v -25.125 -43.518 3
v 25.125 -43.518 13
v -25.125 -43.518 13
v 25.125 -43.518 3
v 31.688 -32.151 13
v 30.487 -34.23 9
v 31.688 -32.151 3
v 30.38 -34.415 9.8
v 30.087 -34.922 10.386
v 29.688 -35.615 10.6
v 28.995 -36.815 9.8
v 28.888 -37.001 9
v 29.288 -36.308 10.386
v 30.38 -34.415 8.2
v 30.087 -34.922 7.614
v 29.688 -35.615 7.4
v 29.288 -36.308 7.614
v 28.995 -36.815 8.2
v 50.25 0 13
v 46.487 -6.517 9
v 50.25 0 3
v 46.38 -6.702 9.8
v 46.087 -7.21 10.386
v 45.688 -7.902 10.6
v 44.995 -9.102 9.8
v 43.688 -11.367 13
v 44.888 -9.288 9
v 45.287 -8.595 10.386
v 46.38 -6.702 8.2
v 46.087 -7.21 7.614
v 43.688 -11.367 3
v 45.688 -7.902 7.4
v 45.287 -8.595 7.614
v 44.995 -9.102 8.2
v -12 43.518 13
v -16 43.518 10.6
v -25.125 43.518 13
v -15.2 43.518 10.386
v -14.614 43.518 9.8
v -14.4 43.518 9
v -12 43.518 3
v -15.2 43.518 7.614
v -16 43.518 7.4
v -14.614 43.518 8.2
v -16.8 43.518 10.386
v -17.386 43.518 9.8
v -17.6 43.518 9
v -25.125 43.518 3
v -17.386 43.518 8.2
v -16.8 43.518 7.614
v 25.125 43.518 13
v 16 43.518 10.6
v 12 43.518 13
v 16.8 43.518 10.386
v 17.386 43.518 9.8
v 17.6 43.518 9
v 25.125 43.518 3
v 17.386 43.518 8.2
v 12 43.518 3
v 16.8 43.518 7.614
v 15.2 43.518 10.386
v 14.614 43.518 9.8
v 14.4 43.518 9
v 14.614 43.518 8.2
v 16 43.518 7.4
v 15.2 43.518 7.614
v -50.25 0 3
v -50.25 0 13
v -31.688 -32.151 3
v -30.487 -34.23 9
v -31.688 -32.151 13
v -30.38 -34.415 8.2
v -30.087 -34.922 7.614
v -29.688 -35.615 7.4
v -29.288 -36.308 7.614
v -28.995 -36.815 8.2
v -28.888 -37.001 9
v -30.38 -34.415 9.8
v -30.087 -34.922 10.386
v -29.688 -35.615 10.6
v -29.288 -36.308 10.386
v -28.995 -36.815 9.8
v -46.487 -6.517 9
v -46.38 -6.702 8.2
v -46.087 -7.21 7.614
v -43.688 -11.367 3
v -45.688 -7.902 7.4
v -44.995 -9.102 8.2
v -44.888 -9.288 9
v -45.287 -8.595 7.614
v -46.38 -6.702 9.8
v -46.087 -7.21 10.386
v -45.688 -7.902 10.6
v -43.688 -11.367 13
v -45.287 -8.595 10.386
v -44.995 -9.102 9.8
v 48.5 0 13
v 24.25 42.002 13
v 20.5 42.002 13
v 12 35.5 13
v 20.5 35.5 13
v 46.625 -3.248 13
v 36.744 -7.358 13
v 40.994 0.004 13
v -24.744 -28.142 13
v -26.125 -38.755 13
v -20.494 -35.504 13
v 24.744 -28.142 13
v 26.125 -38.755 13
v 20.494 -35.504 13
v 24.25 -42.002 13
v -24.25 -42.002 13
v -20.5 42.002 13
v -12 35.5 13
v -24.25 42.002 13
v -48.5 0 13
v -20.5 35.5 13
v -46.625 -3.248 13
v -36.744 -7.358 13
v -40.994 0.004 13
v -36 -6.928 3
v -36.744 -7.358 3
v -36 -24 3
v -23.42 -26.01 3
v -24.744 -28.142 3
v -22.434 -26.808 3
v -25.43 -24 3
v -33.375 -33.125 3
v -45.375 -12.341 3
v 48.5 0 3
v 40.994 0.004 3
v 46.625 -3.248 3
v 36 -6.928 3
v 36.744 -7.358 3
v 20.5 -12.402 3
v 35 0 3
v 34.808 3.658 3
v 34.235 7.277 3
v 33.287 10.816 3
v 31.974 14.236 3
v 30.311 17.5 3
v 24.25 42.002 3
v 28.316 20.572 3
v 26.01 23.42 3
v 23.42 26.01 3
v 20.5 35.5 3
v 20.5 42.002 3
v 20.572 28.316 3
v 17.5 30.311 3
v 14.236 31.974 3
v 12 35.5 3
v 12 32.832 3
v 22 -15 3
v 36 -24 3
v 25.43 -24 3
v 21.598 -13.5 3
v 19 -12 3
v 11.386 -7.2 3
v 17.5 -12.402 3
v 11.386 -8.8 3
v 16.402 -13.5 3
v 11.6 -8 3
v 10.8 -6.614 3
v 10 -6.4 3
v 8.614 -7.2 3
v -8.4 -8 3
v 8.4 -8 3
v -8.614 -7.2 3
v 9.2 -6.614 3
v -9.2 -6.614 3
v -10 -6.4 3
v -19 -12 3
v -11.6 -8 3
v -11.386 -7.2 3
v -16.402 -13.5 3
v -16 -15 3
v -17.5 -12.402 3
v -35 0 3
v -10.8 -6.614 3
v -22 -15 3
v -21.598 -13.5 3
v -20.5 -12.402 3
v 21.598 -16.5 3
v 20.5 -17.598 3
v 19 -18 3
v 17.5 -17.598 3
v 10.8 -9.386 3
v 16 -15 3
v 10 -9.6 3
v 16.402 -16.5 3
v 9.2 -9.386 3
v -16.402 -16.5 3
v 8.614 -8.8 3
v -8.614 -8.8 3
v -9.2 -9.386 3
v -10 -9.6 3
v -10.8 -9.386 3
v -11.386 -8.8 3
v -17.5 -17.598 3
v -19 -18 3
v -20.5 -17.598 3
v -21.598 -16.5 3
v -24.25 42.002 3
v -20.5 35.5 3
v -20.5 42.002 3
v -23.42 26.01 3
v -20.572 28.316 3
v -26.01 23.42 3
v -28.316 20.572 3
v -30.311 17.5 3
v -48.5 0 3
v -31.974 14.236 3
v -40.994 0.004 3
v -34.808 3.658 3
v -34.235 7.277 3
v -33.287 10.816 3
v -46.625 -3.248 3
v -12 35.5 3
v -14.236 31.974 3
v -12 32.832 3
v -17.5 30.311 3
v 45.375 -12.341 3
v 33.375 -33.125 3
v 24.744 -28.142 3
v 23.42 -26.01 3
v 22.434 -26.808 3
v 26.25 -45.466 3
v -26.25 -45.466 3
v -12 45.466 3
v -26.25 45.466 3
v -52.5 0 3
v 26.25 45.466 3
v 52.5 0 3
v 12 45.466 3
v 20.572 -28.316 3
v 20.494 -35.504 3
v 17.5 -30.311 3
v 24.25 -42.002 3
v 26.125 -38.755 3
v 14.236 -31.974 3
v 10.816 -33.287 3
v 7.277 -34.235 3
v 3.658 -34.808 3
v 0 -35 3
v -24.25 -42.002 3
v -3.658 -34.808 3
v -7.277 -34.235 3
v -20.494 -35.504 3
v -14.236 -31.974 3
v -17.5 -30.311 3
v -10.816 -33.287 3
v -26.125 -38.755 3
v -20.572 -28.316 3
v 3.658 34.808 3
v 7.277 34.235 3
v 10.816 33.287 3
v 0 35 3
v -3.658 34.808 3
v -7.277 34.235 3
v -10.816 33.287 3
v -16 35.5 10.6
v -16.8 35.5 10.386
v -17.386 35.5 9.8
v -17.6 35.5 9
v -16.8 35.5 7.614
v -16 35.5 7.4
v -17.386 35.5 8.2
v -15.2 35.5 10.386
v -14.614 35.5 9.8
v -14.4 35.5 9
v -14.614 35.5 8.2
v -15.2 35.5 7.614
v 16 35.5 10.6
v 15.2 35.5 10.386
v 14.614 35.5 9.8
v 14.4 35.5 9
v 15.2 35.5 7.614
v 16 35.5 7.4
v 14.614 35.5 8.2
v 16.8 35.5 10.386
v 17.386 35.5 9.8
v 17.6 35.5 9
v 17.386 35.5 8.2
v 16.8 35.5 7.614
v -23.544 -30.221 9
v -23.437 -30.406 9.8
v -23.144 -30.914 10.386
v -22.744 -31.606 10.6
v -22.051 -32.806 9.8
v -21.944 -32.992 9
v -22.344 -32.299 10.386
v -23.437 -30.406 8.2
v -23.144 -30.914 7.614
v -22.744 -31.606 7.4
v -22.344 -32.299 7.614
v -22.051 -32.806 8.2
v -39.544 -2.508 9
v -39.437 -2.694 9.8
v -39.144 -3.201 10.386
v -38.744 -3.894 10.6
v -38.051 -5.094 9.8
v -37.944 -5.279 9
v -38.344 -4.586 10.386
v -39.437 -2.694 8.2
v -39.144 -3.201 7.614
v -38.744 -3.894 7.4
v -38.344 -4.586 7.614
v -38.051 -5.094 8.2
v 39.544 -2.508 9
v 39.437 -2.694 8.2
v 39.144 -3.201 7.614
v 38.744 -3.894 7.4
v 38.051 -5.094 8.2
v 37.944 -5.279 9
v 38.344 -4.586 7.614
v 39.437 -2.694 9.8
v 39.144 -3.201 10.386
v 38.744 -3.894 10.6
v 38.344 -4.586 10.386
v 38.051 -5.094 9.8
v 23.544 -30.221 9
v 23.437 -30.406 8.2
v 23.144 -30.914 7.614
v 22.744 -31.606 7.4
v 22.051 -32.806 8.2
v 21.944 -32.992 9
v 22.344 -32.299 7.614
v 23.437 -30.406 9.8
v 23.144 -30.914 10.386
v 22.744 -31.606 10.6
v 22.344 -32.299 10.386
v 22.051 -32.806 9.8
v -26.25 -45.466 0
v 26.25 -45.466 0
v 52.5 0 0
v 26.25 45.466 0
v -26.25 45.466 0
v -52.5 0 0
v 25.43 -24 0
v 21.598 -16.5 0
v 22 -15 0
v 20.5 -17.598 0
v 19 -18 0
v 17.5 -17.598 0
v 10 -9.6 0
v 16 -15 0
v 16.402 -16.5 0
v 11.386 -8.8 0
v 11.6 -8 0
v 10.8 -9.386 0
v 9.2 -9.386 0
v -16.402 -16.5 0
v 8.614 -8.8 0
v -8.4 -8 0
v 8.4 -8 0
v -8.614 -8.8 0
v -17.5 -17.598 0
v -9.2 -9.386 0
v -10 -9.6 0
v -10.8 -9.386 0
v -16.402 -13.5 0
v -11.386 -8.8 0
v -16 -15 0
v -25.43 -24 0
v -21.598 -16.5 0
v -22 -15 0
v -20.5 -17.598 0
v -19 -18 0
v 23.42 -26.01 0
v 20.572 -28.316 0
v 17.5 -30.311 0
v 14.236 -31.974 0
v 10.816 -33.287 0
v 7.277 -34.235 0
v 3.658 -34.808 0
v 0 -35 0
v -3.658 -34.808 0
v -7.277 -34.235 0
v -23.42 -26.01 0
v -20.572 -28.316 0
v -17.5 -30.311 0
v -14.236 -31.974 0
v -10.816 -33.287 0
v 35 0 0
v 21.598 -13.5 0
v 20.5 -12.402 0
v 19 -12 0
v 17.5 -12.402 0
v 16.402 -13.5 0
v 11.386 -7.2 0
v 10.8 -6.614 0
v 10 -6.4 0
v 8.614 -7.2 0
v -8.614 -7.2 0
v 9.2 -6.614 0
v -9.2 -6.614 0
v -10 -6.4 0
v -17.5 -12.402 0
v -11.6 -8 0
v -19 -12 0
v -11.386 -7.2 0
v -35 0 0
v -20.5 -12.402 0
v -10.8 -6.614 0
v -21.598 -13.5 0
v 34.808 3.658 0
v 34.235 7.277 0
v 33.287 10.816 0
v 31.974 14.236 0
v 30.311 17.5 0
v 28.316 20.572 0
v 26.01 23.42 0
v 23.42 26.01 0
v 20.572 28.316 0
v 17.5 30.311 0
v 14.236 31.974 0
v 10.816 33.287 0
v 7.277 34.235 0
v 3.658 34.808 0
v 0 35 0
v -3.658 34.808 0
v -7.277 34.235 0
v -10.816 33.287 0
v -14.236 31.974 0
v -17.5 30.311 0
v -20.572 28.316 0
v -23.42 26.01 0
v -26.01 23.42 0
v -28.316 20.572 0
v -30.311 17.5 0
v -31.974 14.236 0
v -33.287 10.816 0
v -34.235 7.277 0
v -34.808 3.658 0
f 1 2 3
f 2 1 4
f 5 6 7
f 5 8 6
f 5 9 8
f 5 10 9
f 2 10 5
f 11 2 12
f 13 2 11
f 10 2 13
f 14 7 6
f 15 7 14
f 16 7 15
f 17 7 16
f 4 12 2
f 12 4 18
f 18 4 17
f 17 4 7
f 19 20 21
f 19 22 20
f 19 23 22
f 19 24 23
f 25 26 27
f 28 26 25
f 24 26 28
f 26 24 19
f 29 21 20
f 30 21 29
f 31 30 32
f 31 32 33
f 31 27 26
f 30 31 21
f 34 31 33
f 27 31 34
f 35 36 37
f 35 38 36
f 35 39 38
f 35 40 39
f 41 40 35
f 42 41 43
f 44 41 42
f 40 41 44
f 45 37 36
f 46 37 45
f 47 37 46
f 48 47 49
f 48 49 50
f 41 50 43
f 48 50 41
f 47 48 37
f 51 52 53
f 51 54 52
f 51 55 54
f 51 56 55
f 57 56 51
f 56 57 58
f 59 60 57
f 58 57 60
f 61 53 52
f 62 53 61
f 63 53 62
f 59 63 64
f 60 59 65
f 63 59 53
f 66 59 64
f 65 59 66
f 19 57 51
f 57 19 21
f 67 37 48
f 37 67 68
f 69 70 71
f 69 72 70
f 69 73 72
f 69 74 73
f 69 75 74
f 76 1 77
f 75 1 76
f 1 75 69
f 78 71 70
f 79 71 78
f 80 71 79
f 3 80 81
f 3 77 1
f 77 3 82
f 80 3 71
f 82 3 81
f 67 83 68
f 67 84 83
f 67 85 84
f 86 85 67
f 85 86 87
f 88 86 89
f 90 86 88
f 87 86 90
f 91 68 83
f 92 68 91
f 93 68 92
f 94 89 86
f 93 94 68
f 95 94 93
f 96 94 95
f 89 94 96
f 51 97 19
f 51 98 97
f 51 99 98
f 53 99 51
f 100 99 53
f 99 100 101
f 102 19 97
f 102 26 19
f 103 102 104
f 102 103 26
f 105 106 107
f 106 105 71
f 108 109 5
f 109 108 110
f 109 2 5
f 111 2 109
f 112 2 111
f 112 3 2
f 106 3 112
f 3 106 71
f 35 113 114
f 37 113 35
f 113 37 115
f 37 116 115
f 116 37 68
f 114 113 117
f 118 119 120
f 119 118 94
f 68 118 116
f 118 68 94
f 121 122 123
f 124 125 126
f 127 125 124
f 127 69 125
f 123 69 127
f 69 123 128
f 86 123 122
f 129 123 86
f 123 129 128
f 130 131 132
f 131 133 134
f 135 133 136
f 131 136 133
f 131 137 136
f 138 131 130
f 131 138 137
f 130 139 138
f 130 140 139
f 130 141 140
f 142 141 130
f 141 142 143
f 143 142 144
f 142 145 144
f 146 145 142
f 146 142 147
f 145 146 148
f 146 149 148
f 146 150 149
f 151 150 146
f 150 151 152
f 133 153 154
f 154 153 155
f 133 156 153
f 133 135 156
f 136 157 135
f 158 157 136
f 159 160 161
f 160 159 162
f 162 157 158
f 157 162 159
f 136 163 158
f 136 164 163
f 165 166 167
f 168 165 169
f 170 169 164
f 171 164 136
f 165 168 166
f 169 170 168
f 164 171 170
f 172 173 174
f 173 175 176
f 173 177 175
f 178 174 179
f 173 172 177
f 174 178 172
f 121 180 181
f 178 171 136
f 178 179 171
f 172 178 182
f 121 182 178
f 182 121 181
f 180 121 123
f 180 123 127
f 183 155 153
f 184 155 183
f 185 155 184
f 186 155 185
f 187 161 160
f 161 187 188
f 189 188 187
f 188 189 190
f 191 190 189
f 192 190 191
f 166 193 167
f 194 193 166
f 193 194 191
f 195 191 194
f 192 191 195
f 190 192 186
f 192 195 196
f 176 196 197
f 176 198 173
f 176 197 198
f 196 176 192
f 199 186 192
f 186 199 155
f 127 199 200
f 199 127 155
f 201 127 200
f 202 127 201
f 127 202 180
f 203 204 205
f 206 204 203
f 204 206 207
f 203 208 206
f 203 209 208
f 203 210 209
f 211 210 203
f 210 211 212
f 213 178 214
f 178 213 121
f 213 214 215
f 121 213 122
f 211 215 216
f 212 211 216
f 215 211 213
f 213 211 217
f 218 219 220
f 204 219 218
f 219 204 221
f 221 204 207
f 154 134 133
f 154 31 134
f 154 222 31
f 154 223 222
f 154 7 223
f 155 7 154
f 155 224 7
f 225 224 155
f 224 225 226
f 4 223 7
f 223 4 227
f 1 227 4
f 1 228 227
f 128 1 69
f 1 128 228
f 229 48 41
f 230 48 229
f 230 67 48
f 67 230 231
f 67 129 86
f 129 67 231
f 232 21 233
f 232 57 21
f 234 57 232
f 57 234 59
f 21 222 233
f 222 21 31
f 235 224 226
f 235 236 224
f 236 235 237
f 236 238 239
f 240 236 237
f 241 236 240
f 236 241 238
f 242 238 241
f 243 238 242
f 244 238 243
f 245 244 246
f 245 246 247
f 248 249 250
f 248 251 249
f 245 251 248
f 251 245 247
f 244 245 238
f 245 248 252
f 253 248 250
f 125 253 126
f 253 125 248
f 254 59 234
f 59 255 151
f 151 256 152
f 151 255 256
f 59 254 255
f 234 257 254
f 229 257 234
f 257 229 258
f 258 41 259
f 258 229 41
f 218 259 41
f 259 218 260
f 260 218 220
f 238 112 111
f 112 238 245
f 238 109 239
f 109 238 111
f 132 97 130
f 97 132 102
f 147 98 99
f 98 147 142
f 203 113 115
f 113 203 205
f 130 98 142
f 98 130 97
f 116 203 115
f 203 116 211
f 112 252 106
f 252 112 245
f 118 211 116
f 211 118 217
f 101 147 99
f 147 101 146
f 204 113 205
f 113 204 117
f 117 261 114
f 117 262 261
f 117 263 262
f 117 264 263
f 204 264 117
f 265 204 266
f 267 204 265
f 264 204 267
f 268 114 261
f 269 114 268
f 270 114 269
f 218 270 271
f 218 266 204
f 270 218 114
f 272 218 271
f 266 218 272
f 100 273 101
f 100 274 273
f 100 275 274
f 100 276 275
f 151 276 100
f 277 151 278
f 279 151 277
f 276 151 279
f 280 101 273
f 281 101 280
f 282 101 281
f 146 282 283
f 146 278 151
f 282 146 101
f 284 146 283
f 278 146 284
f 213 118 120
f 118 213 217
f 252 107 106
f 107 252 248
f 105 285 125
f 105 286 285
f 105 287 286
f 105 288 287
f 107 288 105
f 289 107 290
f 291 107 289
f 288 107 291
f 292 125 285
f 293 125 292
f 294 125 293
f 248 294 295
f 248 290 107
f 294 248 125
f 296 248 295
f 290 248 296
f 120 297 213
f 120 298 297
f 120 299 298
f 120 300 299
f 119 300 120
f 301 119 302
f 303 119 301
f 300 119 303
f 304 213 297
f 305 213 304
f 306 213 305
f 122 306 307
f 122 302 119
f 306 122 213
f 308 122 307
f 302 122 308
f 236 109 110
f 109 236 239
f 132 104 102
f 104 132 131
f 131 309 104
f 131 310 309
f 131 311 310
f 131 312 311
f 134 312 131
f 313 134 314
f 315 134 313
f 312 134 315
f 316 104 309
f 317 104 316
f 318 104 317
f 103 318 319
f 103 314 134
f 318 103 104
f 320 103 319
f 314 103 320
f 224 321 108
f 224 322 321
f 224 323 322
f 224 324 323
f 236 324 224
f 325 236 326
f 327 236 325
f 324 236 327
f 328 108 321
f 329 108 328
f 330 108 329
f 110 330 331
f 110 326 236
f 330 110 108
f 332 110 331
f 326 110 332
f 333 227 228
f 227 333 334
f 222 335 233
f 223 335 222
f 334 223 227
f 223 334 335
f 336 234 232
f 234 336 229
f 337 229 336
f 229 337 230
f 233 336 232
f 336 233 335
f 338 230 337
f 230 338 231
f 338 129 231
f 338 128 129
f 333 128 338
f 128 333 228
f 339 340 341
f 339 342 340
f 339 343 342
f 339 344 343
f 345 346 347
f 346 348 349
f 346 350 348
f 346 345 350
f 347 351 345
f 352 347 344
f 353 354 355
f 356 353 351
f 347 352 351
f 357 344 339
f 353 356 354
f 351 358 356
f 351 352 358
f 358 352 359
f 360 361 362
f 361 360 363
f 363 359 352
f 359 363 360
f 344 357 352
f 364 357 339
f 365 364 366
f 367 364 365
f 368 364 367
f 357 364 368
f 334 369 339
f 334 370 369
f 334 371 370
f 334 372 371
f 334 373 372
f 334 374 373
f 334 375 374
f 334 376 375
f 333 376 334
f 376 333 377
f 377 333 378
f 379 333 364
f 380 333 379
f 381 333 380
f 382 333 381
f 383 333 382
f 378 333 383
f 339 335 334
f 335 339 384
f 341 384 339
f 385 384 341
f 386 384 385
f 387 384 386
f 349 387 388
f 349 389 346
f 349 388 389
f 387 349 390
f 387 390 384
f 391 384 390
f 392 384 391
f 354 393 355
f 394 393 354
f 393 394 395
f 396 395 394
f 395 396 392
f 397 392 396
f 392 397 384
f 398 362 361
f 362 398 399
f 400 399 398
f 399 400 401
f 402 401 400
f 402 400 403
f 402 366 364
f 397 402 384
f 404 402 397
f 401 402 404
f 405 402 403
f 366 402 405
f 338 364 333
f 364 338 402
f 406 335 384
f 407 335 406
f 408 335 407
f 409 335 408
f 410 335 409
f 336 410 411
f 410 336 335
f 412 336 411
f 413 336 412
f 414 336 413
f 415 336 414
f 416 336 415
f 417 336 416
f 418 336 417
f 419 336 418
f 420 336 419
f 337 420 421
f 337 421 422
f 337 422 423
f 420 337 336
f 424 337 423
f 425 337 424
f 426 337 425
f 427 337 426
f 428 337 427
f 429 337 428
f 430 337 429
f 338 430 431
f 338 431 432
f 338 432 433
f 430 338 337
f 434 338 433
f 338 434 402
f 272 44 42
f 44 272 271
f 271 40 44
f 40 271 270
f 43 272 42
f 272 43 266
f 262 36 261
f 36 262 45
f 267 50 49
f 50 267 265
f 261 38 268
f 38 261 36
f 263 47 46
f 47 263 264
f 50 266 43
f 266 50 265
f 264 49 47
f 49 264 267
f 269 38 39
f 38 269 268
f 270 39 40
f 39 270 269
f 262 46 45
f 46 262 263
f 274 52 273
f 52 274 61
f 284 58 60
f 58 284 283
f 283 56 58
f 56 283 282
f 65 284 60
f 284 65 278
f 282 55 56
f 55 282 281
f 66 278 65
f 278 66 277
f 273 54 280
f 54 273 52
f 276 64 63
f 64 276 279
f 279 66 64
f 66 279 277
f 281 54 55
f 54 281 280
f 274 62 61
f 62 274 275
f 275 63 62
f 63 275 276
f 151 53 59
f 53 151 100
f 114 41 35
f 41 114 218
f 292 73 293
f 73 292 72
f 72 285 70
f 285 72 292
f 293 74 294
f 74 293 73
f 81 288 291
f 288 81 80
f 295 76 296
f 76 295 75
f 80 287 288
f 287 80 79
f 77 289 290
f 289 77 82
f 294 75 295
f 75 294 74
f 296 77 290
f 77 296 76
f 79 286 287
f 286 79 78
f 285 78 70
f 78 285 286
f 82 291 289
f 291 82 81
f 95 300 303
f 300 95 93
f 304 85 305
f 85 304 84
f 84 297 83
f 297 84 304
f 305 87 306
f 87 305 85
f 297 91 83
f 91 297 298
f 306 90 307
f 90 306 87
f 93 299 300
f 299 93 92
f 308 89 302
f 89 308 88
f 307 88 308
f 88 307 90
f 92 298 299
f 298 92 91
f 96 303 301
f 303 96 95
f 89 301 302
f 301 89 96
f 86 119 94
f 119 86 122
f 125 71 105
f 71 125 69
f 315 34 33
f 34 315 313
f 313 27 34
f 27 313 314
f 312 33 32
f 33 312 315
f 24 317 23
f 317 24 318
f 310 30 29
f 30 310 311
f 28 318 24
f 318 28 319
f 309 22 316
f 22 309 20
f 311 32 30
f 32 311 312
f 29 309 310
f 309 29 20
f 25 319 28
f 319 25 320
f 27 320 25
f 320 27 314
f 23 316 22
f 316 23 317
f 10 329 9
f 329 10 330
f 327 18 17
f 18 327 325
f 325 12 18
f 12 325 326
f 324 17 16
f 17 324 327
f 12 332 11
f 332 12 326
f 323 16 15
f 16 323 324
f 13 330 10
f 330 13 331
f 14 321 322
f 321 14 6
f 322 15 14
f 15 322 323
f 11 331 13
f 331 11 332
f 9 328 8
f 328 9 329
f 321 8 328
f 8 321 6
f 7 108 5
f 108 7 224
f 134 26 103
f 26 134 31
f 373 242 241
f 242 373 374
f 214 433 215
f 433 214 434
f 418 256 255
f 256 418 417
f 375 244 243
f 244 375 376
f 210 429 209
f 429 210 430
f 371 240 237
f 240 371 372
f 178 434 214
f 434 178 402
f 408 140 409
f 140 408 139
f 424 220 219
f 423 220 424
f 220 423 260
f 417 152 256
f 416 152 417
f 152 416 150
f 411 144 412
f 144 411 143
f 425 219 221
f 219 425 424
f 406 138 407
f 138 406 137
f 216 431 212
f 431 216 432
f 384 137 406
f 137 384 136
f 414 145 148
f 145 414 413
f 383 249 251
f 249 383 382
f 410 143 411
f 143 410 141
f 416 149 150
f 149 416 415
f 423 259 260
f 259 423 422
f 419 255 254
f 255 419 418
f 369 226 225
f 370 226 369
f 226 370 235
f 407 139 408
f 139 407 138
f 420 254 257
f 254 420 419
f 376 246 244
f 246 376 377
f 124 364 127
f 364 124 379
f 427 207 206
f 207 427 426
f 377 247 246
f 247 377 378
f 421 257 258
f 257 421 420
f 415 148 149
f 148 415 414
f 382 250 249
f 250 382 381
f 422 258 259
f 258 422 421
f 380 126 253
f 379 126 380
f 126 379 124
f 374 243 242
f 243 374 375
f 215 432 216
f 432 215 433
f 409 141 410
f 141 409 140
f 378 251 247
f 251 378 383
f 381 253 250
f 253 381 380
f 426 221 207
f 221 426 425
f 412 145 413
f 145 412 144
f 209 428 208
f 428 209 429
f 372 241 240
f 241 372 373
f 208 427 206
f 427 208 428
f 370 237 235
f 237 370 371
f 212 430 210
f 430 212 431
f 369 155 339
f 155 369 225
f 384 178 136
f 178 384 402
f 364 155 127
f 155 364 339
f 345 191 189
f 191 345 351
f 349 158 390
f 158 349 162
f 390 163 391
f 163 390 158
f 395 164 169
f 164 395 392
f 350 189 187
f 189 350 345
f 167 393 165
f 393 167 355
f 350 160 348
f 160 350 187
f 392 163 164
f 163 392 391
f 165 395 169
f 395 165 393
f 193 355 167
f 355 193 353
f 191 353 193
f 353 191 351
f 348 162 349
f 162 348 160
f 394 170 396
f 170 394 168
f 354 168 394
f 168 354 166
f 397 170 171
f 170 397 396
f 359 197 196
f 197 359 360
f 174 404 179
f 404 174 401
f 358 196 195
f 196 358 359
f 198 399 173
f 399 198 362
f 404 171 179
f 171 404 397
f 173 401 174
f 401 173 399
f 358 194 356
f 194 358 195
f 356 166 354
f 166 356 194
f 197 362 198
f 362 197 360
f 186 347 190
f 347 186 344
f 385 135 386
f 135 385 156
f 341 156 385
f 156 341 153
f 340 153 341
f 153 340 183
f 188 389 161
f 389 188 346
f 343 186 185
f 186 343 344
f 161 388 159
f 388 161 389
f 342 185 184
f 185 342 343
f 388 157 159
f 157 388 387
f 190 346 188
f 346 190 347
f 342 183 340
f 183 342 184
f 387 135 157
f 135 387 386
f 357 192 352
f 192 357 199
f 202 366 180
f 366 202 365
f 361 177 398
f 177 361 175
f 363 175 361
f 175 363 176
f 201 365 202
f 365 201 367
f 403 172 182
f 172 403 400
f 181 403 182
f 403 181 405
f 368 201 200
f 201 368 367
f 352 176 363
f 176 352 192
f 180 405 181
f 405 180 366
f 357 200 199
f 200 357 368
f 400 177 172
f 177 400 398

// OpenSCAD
$fn=12;
difference(){

union(){    
cylinder(d=105,h=3,$fn=6);
difference(){
translate([0,0,3])cylinder(d=100.5,h=10,$fn=6);
translate([0,0,3])cylinder(d=97,h=10,$fn=6);
}    
for(i=[0:120:300]){
rotate([0,0,i])translate([0,39.5,7]) 
    cube([41,8,12],center=true);    
}
}
cylinder(d=70,h=12,$fn=60);    
    
for(i=[0:120:300]){
rotate([0,0,i]){
    translate([-16,0,9])rotate([-90,0,0])
    cylinder(d=3.2,h=100);
    translate([16,0,9])rotate([-90,0,0])
    cylinder(d=3.2,h=100);
    translate([-12,0,3])cube([24,120,10]);
}
}
}


difference(){
translate([0,-12,1.5])cube([72,24,3],center=true);
translate([10,-8,0]) cylinder(d=3.2,h=3);
translate([-10,-8,0]) cylinder(d=3.2,h=3);
translate([19,-15,0]) cylinder(d=6,h=3);
translate([-19,-15,0]) cylinder(d=6,h=3);
}
